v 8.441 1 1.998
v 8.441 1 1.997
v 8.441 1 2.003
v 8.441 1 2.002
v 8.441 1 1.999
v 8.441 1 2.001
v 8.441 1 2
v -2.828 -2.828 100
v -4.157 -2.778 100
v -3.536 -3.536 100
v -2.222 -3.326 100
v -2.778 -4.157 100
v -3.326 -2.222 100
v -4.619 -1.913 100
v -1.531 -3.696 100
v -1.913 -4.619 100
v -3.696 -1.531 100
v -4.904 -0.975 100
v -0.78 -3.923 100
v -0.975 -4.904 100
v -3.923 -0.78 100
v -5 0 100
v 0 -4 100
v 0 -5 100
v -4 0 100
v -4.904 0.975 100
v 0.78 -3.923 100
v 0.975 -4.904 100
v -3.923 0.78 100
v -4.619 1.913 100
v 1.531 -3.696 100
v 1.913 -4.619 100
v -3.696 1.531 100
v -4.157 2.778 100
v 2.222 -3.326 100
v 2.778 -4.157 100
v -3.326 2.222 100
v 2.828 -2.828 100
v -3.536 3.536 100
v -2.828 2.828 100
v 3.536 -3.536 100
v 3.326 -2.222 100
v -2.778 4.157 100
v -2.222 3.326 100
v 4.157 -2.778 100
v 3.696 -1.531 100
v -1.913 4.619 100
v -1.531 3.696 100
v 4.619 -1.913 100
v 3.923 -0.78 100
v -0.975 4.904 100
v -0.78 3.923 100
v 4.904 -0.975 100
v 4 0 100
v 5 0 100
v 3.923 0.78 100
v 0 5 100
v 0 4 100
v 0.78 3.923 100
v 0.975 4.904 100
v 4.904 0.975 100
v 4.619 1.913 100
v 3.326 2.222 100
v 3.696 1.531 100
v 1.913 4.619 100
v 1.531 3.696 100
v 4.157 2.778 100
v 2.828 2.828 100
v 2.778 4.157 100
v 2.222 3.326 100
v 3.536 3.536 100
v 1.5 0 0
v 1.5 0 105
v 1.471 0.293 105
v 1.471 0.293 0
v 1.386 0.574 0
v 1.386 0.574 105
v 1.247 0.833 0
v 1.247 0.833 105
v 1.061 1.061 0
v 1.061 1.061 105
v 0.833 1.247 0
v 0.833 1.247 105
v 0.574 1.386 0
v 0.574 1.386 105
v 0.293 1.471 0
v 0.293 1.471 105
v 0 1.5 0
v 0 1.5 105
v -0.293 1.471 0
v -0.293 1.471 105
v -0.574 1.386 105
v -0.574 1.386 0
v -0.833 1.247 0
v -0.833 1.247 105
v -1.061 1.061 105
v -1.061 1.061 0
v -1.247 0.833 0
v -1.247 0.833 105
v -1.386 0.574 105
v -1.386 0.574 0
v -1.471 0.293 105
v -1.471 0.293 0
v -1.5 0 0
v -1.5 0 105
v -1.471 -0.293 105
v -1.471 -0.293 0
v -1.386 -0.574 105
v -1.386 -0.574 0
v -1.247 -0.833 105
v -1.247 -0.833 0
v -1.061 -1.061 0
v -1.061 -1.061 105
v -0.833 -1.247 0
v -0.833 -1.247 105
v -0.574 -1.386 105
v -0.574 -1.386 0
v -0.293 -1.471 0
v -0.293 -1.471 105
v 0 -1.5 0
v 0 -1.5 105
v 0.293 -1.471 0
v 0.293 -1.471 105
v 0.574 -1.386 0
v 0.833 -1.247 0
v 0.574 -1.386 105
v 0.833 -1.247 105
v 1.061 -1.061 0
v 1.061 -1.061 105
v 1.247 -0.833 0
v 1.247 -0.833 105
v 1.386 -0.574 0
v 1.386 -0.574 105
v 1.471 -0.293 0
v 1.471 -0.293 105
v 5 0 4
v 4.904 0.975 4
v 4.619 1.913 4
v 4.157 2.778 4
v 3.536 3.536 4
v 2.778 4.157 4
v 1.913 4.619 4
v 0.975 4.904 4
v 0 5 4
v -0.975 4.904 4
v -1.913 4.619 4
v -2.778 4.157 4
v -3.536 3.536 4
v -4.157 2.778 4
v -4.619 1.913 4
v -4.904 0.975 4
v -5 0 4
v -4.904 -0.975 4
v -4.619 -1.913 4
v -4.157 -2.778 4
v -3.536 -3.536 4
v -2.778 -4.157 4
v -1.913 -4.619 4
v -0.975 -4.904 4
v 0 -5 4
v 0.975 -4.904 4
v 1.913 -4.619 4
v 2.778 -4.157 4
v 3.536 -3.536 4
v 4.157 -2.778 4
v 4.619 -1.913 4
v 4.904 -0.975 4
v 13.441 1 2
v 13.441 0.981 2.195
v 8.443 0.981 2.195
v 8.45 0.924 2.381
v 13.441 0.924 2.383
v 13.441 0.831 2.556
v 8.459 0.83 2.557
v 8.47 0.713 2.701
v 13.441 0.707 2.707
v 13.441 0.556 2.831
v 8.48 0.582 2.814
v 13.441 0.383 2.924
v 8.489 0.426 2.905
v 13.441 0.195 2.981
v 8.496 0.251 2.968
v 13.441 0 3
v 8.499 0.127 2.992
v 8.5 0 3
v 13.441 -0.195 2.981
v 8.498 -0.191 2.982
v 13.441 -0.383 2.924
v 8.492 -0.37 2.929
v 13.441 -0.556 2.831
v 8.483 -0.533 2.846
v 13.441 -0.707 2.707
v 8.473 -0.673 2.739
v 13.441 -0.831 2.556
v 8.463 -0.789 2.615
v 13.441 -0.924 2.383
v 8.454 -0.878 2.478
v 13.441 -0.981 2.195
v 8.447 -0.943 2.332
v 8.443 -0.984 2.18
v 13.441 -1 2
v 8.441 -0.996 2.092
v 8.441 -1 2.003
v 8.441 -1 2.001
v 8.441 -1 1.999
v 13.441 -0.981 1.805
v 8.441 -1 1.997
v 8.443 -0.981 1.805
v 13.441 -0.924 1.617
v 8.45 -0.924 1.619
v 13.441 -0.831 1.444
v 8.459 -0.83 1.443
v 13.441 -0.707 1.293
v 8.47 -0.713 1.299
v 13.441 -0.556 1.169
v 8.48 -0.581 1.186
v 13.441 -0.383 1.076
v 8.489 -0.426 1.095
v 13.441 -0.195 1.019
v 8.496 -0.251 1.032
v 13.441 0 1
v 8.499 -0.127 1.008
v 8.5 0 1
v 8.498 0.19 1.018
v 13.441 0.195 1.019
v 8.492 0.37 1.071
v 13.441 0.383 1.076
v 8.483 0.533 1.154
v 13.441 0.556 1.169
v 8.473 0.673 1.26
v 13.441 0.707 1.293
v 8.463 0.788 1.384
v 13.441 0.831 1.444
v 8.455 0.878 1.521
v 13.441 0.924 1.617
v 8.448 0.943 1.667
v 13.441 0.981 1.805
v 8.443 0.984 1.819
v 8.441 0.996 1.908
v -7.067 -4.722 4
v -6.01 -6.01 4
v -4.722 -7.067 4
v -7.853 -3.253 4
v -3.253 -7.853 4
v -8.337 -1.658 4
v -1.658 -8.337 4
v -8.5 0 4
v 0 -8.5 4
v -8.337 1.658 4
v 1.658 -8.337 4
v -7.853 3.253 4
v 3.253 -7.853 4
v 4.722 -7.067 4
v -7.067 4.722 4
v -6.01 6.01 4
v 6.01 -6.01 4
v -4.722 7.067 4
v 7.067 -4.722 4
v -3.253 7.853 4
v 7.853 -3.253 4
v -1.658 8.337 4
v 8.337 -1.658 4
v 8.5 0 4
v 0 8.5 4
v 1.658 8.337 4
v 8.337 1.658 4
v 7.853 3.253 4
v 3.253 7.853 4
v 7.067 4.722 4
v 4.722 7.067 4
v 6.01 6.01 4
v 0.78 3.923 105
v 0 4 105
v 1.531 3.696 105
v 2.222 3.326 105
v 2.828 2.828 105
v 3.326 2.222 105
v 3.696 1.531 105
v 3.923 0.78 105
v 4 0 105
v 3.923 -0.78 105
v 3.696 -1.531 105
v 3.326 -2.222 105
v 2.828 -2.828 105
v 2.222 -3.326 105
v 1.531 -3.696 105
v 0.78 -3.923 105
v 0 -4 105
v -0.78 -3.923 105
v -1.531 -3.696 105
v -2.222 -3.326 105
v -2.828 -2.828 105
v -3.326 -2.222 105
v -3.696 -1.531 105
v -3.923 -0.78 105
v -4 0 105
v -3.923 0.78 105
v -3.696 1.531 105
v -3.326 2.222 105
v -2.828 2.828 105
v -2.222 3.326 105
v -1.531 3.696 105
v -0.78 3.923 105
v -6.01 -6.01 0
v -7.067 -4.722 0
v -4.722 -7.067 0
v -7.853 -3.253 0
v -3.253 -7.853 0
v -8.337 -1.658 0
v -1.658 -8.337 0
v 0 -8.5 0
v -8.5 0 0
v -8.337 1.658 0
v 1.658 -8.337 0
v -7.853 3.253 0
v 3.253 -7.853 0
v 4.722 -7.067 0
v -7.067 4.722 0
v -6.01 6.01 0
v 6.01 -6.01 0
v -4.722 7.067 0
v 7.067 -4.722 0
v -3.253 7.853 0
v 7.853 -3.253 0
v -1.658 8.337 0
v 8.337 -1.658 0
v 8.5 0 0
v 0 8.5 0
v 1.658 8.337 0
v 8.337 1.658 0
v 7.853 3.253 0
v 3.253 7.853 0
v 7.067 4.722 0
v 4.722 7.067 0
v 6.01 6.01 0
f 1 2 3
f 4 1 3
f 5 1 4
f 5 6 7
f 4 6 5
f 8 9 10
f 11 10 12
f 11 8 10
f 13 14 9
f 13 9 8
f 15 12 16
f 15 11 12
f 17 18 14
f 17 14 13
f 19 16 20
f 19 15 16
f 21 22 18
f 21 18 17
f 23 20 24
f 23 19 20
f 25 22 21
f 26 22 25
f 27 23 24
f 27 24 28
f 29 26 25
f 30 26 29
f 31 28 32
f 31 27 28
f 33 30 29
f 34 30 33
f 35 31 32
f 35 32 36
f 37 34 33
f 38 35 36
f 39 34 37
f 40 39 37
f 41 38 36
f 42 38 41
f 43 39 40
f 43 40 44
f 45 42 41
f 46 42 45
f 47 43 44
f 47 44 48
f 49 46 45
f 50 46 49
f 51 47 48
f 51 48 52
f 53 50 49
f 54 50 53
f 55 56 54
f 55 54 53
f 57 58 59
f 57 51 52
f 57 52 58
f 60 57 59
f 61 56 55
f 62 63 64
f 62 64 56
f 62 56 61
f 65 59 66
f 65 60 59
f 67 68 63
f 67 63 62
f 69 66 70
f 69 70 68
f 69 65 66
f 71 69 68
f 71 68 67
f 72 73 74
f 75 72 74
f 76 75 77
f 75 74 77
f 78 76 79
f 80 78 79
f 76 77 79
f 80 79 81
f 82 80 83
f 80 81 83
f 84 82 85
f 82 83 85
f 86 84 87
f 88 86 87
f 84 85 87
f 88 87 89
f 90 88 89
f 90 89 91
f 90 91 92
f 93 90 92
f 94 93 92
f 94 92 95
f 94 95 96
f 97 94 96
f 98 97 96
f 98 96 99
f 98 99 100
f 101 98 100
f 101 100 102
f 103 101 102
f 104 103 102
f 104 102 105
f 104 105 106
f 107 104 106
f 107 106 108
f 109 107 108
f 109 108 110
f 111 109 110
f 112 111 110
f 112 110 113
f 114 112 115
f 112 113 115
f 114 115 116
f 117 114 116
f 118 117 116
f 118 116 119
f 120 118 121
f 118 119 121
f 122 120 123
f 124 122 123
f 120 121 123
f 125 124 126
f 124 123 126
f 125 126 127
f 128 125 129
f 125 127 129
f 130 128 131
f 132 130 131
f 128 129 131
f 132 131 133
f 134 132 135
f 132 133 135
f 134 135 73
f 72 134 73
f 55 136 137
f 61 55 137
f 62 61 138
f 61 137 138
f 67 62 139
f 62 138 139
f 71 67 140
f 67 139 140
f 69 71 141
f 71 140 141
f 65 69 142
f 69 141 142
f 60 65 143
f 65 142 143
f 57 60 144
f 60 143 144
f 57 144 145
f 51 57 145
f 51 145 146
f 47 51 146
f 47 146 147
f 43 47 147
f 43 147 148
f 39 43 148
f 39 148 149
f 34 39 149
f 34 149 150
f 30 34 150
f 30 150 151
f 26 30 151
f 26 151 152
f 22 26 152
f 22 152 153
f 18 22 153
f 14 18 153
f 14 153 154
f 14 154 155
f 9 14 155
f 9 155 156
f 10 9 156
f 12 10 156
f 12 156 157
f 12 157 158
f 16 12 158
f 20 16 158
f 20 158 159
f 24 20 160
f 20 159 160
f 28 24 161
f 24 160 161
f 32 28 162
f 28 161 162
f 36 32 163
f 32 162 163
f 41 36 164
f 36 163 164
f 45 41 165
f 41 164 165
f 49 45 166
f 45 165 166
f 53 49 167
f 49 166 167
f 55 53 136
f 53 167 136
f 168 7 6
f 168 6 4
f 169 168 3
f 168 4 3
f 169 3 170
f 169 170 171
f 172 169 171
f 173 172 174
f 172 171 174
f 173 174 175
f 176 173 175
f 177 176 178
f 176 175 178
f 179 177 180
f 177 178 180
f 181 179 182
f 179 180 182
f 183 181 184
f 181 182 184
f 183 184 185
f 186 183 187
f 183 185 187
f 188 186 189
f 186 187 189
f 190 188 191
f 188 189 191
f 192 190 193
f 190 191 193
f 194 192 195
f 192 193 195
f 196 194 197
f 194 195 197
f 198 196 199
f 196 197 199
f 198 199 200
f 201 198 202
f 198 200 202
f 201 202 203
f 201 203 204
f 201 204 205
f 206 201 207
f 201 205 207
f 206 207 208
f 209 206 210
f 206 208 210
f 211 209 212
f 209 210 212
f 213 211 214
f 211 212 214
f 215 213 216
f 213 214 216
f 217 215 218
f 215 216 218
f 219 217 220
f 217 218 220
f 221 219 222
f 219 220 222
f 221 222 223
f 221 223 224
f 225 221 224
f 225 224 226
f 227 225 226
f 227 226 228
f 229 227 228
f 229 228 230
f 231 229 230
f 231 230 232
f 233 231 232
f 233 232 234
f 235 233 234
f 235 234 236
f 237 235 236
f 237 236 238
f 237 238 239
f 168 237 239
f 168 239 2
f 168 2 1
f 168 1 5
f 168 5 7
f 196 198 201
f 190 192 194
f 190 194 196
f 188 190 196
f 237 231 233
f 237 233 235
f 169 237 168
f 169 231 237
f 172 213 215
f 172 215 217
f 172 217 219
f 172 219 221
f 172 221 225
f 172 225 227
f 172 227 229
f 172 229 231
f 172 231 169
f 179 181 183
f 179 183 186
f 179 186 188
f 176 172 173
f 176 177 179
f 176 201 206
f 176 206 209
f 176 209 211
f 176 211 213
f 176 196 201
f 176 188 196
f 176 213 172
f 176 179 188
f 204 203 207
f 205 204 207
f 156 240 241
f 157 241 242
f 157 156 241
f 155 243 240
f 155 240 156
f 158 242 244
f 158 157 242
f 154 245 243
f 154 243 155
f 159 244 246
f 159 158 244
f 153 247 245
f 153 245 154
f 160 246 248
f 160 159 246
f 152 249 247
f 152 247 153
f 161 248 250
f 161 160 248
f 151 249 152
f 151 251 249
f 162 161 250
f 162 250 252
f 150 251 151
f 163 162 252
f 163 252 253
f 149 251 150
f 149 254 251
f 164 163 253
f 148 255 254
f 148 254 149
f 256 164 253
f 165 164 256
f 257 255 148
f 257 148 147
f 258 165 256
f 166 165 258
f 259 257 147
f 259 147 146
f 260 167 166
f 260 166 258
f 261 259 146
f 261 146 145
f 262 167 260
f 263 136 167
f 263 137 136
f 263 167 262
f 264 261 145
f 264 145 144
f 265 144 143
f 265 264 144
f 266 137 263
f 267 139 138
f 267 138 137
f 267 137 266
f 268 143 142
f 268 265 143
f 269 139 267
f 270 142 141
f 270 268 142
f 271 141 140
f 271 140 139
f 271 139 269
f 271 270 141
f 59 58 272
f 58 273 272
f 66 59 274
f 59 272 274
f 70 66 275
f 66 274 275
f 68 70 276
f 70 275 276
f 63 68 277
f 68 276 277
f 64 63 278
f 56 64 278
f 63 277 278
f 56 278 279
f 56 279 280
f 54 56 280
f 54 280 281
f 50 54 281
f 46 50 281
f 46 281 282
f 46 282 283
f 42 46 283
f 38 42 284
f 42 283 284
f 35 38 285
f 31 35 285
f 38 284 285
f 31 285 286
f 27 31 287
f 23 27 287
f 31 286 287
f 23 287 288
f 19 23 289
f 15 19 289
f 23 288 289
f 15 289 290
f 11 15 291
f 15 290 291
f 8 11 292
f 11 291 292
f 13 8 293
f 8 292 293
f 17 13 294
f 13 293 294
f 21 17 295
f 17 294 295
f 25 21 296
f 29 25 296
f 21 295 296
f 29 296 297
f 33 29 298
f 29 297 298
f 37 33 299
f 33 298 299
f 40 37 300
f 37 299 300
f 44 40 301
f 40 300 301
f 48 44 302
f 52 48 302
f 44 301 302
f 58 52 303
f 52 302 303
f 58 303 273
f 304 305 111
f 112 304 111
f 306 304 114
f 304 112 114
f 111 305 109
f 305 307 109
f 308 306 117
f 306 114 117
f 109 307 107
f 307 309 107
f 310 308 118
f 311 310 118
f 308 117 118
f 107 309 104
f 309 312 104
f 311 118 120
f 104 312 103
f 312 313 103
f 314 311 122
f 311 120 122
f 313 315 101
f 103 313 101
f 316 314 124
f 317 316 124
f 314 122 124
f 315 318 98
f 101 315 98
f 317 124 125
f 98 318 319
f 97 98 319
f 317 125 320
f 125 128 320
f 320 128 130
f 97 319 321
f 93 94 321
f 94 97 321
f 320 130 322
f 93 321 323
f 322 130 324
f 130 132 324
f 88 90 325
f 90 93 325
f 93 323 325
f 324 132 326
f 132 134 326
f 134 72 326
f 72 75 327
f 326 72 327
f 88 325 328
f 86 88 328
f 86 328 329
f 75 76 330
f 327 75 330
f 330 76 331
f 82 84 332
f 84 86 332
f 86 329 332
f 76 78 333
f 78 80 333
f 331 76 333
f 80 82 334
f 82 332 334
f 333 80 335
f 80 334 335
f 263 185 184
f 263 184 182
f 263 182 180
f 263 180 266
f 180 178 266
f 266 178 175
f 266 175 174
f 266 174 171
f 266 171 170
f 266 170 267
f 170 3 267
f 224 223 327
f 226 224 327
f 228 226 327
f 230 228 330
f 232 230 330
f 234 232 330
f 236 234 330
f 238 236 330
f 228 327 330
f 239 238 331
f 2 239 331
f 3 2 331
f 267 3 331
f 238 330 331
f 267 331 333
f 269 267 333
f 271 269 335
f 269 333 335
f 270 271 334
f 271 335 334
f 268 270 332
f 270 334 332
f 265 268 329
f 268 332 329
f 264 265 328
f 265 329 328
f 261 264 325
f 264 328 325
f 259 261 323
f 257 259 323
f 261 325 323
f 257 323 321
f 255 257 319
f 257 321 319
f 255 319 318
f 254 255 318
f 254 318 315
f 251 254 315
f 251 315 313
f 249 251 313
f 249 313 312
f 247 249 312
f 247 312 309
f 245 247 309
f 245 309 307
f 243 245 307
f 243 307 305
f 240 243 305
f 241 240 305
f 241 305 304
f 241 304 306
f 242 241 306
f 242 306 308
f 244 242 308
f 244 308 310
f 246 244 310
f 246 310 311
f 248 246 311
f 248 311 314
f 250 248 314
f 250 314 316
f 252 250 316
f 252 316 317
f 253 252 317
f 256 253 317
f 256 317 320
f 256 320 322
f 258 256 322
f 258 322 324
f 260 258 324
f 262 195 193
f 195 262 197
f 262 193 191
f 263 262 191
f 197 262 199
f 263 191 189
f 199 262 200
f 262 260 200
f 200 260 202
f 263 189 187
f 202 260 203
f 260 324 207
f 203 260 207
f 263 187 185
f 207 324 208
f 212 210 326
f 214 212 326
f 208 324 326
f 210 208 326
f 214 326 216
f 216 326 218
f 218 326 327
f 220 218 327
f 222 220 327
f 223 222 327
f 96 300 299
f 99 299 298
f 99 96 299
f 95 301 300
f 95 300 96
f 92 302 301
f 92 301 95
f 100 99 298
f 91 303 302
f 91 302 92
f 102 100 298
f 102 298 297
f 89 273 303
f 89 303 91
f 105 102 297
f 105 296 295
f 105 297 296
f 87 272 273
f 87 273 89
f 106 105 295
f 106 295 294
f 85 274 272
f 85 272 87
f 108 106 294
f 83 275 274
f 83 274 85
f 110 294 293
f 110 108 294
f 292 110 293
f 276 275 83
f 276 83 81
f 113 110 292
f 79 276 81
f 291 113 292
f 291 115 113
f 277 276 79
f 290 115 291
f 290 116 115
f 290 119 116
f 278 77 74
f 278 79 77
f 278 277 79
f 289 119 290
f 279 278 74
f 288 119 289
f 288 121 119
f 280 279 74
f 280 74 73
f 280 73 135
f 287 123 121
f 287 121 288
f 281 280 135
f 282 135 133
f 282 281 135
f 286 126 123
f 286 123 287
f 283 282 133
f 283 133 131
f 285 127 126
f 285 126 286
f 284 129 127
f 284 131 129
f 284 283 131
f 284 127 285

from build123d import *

# Parameters (mm, degrees)
F0_R      = 8.5
F1_DEPTH  = 4
F3_R      = 5
F4_DEPTH  = 100
F5_W      = 4
F5_H      = 5
F9_R      = 1
F10_DEPTH = 5
F11_R     = 1.5
F12_DEPTH = 128.4


with BuildPart() as f1:
    # F0 (on Top) → F1 (new body)
    with BuildSketch(Plane.XY):
        Circle(F0_R)
    extrude(amount=F1_DEPTH)

    # F3 (on Top) → F4 (join)
    with BuildSketch(Plane.XY):
        Circle(F3_R)
    extrude(amount=F4_DEPTH)

    # F5 (on Right) → F6 (revolve)
    with BuildSketch(Plane.YZ):
        with Locations((2, 102.5)):
            Rectangle(F5_W, F5_H)
    revolve(axis=Axis((0, 0, 102.5), (0, 0, -1)))

    # F9 (on face) → F10 (join)
    with BuildSketch(Plane.YZ.offset(8.440972)):
        with Locations((0, 2)):
            Circle(F9_R)
    extrude(amount=F10_DEPTH)

    # F11 (on face) → F12 (cut)
    with BuildSketch(Plane.XY.offset(105)):
        Circle(F11_R)
    extrude(amount=-F12_DEPTH, mode=Mode.SUBTRACT)


solid = f1.part
